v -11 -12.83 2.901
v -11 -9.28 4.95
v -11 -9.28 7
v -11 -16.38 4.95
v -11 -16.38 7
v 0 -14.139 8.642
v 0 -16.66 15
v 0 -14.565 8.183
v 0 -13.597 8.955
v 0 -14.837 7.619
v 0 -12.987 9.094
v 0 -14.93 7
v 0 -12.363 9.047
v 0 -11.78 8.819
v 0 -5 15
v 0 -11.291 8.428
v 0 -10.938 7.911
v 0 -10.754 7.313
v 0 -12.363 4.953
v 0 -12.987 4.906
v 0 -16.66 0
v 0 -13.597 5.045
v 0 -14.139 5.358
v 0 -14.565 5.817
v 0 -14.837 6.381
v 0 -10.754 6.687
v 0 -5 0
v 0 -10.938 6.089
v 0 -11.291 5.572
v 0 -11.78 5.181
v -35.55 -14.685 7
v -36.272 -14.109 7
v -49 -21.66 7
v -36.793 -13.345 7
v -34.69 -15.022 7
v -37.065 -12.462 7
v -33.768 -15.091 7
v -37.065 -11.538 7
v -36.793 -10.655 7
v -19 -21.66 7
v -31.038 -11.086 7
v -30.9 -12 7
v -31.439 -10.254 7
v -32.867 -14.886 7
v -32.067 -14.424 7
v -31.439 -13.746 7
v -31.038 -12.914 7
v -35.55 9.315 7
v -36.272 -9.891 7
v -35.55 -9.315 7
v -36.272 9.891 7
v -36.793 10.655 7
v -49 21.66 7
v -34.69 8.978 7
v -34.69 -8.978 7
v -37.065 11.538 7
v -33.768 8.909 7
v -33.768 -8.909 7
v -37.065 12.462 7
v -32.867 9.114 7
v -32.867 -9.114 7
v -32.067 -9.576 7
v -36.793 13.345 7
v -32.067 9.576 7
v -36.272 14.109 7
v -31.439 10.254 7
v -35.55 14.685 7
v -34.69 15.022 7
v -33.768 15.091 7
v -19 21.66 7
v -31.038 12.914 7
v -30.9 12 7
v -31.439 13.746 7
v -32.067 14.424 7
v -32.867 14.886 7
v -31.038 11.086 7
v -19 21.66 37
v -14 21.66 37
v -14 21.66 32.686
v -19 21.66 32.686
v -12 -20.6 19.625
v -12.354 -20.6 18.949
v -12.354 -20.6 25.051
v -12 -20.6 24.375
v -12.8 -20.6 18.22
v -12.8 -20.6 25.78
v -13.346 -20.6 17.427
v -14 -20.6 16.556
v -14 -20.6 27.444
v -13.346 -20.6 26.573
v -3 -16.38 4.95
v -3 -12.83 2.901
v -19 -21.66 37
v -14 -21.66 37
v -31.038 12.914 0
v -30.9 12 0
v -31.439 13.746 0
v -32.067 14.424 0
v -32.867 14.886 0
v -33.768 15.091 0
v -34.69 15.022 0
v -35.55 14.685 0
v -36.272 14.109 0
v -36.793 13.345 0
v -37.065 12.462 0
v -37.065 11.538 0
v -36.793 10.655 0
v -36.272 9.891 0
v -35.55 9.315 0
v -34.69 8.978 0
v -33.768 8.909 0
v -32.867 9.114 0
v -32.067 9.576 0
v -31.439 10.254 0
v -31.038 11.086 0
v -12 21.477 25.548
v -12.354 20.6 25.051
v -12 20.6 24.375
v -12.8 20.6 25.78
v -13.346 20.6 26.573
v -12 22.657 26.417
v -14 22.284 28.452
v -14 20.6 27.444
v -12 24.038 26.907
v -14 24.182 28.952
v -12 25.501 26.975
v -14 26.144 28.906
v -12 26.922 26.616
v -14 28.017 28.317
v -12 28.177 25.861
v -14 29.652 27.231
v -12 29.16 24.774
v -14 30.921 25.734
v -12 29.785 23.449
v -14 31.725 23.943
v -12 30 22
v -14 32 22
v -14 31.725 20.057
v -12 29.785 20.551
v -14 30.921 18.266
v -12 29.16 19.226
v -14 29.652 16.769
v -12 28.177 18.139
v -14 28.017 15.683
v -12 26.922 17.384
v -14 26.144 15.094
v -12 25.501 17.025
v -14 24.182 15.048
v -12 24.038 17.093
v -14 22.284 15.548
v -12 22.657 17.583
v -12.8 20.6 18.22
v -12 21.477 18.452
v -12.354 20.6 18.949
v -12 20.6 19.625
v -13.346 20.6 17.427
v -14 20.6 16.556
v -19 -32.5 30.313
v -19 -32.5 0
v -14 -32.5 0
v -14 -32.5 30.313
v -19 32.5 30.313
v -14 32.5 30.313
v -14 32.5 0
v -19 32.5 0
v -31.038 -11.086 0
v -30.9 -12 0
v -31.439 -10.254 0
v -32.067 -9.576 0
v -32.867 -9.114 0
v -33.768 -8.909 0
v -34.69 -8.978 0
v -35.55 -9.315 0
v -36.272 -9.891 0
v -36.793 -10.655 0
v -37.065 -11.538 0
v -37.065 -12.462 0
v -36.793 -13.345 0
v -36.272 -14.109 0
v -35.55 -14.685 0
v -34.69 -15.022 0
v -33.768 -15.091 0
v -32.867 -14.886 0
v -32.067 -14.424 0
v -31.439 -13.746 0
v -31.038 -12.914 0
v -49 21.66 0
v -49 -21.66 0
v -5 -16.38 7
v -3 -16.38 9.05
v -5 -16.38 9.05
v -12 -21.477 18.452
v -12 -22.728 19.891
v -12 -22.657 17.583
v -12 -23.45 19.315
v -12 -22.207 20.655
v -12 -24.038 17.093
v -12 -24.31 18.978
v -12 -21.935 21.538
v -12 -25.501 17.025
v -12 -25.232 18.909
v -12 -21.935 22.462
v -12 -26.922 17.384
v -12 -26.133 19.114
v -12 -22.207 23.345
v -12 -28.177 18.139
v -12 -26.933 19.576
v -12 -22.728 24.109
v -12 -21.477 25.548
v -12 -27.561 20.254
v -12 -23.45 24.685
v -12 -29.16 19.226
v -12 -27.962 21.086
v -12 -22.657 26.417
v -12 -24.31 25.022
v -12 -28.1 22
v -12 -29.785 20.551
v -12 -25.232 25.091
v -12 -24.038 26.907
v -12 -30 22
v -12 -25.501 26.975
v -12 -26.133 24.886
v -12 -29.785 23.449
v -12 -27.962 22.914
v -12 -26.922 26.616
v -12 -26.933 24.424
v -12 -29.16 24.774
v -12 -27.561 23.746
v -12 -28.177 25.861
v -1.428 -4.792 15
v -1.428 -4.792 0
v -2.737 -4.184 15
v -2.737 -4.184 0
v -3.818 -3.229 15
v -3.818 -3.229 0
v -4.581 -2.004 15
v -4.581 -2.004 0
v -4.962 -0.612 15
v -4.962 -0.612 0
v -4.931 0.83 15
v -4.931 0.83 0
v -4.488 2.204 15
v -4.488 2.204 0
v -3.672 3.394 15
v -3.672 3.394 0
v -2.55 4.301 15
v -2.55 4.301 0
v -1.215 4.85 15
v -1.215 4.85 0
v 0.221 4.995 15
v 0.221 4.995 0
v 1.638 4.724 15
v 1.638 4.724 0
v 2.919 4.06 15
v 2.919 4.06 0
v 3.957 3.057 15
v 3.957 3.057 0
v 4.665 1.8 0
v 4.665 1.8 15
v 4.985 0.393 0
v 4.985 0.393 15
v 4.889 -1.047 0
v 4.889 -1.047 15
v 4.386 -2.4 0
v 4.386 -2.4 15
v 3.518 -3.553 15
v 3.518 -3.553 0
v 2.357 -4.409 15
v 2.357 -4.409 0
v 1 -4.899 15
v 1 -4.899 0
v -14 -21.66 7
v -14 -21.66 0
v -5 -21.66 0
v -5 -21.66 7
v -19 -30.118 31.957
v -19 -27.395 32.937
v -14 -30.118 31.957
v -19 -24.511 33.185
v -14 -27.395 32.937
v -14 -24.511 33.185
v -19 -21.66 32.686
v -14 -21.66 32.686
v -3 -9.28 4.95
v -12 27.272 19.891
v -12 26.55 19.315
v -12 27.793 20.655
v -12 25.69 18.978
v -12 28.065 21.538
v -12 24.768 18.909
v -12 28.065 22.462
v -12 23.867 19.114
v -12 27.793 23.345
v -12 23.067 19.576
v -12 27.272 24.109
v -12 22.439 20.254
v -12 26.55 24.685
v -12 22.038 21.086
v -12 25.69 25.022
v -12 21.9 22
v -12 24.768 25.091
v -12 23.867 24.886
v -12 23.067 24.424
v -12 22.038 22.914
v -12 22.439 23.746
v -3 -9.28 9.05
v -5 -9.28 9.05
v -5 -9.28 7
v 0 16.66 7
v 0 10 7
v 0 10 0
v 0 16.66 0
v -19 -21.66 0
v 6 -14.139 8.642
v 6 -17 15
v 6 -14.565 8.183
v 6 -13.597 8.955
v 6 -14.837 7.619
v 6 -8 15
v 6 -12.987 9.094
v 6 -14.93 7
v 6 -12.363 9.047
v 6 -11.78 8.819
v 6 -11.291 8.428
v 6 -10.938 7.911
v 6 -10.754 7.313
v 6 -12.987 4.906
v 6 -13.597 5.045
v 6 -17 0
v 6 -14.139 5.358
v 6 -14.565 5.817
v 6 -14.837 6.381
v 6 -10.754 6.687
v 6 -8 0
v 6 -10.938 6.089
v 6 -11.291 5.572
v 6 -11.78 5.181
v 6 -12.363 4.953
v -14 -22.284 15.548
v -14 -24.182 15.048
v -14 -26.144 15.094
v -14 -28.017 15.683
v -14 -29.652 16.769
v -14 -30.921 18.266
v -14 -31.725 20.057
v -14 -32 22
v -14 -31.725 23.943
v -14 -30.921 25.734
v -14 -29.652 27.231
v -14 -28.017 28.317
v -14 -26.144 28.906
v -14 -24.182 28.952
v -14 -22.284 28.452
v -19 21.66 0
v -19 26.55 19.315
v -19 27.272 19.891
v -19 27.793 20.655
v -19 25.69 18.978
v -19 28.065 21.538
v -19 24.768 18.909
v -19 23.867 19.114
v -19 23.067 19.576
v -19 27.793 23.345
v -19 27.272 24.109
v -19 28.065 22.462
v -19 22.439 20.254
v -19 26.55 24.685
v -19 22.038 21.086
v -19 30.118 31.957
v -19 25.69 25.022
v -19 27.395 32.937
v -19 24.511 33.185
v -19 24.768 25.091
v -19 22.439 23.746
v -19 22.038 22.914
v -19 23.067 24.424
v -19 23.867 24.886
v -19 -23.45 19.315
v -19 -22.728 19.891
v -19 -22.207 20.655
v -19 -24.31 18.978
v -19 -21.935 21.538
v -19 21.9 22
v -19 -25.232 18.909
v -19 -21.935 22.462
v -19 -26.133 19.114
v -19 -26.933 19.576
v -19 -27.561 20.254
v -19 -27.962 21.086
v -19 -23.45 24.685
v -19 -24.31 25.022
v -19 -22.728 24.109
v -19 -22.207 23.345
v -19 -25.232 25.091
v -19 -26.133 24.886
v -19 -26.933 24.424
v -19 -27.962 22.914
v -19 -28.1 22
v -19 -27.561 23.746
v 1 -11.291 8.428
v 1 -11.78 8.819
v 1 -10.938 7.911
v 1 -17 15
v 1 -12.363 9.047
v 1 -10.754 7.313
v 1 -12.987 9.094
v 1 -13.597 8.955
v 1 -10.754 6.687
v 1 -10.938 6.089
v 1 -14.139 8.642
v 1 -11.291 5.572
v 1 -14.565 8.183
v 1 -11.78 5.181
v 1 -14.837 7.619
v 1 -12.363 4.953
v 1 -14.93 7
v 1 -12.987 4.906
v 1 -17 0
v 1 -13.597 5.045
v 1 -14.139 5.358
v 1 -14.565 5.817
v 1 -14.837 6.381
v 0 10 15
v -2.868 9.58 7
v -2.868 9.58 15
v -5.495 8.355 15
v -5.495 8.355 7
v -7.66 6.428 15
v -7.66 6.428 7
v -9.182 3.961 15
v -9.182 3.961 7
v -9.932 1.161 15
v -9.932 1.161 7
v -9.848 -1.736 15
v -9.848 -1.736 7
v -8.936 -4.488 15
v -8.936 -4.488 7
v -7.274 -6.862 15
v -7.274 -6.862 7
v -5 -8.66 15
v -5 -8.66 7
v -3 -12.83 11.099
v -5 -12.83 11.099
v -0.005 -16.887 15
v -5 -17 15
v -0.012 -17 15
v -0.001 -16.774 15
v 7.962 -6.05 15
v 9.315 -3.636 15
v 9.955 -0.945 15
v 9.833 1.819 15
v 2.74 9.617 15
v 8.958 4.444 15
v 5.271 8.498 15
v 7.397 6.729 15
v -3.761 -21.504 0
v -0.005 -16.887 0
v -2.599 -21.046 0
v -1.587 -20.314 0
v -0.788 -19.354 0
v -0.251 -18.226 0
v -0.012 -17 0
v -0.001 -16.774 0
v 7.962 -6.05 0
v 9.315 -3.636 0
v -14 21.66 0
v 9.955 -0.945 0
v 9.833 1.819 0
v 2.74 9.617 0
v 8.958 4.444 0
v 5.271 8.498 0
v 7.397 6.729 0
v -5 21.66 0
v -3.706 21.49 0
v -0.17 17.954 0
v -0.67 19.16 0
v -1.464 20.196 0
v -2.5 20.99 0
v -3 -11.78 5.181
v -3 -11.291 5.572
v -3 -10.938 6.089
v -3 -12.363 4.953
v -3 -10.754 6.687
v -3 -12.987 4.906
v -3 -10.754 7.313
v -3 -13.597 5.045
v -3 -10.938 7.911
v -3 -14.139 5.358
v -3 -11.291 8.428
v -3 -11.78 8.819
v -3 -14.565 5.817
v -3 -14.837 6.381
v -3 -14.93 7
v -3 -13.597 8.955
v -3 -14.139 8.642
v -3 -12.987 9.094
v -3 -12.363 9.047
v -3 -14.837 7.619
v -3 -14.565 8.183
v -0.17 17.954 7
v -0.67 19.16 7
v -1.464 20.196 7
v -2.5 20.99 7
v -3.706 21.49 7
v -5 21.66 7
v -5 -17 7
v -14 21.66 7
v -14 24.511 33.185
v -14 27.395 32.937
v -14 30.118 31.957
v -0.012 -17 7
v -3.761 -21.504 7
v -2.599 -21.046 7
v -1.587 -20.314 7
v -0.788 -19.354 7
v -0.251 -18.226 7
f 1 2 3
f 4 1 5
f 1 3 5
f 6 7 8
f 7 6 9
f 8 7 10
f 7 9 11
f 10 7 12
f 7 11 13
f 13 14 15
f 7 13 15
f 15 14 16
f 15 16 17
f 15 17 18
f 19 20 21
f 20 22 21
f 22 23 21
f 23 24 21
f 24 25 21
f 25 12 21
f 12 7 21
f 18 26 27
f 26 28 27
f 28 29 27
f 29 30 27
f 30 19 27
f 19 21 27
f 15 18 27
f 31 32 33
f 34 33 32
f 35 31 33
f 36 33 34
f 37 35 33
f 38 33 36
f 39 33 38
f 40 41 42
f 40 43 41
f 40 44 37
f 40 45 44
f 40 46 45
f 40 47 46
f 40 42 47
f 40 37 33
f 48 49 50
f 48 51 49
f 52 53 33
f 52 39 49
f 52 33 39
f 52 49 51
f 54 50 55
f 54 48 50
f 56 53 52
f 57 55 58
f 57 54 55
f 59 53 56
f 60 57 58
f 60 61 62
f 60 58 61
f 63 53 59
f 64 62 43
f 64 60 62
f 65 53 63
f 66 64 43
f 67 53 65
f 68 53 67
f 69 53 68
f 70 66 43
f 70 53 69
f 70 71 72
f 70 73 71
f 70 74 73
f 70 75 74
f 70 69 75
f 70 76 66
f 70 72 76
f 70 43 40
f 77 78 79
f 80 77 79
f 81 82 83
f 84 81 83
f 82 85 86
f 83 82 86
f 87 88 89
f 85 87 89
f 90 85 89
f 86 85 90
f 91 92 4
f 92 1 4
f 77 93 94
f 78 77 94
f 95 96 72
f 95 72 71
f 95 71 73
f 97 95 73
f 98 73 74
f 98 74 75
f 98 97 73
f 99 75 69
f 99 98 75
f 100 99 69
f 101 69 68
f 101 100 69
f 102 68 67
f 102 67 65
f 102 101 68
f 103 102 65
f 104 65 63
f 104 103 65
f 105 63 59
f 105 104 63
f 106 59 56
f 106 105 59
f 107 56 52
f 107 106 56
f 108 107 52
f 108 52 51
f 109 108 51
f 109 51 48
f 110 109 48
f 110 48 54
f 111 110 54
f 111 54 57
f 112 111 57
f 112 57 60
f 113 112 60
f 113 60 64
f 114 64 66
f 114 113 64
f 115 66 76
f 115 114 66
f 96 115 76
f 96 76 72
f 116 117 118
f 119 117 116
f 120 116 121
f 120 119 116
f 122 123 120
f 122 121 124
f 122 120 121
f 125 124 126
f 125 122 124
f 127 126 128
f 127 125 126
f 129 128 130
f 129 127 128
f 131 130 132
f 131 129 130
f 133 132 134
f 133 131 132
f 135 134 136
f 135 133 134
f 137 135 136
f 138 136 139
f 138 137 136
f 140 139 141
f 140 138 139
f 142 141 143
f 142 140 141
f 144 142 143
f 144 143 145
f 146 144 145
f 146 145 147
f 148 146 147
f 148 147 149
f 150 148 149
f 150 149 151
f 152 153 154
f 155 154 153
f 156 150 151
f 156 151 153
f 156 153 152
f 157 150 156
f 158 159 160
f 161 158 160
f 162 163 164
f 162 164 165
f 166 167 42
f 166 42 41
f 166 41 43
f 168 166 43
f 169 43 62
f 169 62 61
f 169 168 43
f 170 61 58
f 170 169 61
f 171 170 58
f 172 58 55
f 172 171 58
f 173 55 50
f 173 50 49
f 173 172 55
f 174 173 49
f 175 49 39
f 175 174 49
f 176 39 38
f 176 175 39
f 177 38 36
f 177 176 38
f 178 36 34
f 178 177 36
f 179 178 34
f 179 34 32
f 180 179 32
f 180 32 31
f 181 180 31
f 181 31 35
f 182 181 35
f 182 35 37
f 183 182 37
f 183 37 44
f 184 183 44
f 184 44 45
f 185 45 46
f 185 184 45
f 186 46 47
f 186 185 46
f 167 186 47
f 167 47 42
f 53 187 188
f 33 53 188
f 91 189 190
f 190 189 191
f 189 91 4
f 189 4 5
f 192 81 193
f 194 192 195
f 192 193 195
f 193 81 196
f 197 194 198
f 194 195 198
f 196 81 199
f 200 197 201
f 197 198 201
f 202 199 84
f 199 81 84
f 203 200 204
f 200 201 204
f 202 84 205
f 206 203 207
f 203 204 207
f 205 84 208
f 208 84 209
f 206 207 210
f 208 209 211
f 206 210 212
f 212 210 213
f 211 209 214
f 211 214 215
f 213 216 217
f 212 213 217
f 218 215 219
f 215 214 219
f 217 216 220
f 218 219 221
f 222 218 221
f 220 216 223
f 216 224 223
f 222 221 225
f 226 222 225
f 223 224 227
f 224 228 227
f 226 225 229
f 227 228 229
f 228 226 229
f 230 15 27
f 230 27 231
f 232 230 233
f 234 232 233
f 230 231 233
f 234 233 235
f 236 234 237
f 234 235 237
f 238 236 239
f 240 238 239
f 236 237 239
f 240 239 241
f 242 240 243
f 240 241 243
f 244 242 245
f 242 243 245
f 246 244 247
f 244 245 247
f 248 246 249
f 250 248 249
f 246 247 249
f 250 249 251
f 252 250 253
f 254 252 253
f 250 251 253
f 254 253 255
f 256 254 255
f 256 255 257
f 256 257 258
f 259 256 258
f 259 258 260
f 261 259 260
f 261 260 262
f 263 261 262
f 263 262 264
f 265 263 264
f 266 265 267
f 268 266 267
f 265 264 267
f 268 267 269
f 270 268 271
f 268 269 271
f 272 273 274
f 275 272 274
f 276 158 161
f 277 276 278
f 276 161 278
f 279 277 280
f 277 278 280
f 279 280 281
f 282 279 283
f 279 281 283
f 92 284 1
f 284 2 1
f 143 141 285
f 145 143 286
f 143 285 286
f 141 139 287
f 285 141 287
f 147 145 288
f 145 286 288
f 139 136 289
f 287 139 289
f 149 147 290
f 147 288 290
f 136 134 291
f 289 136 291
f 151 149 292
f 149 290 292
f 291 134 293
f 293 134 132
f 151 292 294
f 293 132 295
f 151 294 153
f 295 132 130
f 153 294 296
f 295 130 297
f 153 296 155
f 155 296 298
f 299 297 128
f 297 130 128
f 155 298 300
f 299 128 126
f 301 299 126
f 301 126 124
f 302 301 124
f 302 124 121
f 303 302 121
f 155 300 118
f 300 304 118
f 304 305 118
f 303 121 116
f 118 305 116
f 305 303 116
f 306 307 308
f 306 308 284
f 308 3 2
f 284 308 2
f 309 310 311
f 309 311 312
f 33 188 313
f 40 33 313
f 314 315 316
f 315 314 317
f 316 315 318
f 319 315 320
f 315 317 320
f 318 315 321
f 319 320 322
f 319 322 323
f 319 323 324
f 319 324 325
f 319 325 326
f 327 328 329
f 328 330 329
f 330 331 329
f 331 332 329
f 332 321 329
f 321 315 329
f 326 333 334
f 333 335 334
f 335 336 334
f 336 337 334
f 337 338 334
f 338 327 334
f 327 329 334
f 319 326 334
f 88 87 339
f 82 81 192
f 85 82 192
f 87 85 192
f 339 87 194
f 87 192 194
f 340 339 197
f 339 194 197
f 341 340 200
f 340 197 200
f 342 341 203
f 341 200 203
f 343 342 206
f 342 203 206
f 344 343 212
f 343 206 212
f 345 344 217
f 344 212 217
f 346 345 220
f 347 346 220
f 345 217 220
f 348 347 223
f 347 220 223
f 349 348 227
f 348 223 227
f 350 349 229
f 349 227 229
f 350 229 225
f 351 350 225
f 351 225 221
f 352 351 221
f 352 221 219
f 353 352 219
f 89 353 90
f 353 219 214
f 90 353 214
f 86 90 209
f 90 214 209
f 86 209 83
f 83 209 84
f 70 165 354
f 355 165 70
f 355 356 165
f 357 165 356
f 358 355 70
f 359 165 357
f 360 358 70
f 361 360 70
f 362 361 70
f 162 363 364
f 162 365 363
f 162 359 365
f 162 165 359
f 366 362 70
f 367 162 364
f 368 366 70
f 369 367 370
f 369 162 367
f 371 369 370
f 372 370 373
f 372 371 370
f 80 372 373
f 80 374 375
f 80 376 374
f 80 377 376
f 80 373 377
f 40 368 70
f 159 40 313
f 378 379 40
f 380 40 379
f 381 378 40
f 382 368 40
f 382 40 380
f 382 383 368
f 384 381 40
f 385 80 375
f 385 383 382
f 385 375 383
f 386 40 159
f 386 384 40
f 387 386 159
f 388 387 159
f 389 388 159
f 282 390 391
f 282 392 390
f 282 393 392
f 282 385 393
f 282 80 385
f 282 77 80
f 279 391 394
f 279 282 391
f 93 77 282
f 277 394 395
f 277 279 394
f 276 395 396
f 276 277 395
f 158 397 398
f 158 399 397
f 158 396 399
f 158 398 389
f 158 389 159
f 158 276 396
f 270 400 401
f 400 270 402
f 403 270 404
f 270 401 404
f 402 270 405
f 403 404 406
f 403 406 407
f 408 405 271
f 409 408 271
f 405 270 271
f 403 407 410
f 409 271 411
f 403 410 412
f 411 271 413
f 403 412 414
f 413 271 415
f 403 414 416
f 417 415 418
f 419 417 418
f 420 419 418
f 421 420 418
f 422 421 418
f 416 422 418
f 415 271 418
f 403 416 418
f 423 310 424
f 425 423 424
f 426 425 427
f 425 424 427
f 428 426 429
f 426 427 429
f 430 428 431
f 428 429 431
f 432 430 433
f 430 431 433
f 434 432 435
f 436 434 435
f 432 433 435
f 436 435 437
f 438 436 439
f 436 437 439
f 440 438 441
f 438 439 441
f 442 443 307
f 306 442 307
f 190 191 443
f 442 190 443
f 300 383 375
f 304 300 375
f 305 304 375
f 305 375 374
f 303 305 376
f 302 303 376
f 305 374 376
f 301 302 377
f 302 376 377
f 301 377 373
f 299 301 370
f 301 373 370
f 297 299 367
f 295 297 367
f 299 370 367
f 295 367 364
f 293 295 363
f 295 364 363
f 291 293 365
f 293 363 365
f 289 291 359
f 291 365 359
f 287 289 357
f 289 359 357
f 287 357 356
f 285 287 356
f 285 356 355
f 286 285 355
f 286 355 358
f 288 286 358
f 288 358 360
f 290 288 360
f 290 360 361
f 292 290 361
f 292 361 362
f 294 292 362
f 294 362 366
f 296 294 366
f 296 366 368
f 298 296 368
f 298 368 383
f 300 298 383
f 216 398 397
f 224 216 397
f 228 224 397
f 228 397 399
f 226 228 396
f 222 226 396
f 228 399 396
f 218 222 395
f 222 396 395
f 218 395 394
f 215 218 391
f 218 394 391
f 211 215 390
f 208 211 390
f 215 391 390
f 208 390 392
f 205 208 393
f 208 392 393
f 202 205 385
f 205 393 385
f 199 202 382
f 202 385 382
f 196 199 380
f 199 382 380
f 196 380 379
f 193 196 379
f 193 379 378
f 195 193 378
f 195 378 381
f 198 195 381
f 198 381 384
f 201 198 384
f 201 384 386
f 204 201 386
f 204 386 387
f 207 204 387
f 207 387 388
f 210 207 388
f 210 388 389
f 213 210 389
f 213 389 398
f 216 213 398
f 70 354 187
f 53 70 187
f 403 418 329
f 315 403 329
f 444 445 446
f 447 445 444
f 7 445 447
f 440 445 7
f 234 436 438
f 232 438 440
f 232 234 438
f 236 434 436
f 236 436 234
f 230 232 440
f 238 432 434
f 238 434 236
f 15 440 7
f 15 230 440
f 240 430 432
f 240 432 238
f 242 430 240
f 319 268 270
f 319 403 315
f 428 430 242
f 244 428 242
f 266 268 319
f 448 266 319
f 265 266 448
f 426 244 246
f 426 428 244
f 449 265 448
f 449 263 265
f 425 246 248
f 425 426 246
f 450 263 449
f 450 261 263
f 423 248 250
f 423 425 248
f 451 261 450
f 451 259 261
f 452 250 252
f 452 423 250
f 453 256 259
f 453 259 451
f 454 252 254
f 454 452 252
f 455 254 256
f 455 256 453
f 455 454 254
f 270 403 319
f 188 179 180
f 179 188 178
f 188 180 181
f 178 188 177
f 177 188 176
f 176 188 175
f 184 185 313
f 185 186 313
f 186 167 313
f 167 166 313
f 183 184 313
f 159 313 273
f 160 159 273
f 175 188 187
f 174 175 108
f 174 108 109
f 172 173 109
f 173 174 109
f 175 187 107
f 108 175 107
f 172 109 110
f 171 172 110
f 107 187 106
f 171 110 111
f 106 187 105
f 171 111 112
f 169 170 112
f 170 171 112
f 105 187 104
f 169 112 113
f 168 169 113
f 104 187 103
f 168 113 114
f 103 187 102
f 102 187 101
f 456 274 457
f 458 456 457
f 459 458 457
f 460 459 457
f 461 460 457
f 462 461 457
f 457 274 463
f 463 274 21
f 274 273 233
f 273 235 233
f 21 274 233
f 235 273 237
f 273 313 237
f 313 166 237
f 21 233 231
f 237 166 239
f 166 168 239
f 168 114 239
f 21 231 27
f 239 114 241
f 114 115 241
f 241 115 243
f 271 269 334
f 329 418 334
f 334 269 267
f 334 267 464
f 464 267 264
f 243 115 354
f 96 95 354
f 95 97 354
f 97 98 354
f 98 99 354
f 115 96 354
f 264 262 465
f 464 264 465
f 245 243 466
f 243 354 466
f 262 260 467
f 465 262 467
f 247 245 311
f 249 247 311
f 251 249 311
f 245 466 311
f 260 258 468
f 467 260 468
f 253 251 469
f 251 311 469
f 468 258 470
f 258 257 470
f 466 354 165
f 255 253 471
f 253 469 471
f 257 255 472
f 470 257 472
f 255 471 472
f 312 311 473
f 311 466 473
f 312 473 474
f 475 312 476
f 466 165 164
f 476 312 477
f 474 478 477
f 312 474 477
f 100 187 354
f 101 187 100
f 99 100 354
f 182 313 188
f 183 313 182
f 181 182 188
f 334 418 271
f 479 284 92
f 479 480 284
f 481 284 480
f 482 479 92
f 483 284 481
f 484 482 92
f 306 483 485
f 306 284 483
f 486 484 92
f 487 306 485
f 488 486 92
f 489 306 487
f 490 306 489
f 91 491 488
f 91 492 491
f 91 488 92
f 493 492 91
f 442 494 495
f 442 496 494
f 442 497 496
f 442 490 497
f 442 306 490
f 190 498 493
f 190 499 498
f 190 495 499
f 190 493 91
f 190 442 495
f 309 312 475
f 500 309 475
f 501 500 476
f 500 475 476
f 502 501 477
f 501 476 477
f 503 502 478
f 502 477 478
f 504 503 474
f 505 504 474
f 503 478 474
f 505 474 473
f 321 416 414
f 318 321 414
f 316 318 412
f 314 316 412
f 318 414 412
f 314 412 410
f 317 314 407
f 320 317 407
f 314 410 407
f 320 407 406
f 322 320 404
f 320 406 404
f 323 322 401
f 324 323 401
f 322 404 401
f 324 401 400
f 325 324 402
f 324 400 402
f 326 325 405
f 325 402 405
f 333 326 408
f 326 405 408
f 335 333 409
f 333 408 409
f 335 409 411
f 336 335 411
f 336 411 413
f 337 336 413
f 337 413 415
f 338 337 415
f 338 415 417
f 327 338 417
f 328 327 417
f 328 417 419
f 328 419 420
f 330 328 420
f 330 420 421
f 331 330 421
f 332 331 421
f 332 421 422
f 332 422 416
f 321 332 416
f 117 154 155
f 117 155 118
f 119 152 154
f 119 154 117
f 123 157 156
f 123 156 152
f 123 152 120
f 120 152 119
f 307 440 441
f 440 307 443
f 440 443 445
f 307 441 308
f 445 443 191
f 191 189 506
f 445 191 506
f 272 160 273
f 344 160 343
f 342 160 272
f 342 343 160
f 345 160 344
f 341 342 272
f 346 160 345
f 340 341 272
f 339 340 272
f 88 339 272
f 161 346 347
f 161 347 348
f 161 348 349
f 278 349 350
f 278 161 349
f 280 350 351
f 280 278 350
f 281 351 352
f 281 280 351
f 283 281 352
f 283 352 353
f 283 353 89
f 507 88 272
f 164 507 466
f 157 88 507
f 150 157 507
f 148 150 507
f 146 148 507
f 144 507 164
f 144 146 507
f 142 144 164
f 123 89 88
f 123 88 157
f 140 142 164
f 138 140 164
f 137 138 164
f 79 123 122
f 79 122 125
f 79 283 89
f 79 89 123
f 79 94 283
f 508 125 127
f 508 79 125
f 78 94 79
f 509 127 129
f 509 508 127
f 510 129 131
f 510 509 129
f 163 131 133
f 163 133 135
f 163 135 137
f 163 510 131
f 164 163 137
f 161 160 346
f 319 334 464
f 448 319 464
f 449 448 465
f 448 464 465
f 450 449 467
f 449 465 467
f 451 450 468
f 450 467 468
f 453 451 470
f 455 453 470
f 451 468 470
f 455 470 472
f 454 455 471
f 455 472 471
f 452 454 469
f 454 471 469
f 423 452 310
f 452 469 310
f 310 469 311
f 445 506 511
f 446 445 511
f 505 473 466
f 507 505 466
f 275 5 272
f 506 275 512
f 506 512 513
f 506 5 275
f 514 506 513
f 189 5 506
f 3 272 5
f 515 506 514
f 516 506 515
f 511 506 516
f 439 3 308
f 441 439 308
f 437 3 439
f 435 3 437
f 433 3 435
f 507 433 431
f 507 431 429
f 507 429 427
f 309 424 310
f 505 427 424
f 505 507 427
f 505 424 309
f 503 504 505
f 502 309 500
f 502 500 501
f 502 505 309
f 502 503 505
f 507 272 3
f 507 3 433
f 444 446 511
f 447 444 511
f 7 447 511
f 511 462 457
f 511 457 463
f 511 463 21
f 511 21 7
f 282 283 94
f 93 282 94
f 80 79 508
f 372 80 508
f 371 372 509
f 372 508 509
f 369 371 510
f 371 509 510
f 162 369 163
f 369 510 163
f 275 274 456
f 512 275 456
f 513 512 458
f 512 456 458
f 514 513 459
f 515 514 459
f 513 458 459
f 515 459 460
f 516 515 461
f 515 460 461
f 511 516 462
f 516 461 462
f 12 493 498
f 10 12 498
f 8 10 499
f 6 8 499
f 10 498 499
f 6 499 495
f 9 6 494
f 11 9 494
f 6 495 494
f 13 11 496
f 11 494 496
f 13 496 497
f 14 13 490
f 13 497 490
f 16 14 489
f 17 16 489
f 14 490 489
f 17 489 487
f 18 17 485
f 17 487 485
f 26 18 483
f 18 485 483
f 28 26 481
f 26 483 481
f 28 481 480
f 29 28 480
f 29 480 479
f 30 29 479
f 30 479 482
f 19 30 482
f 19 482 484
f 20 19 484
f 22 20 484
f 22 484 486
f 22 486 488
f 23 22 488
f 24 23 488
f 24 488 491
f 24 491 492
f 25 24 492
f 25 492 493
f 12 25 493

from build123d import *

# Parameters (mm, degrees)
F0_R          = 3.1
F1_DEPTH      = 7
F2_DEPTH      = 15
F4_DEPTH      = 2
F4_DEPTH_BACK = 6
F5_R          = 2.1
F6_DEPTH      = 25
F8_DEPTH      = 30
F9_DEPTH      = 25
F9_DEPTH_BACK = 7
F10_R         = 3.1
F11_DEPTH     = 25
F12_R         = 5
F12_R_2       = 3.1
F13_DEPTH     = 7
F14_SIZE      = 1.99999
F15_W         = 3.459926136
F15_H         = 15.633740799
F16_DEPTH     = 25
F18_DEPTH     = 25


# Not quite as in the source:
# - a fillet or chamfer is up to 0.001 mm smaller than in the source, because OpenCascade refuses the exact size


with BuildPart() as f1:
    # F0 (on Top) → F1 (new body)
    with BuildSketch(Plane.XY):
        with BuildLine():
            ThreePointArc((-5, -21.6602540378), (-1.5866973333, -20.3139323085), (-0.0115560862, -17))
            Line((-0.0115560862, -17), (-5, -17))
            Line((-5, -17), (-5, -8.6602540378))
            ThreePointArc((-5, -8.6602540378), (-9.6592582629, 2.588190451), (0, 10))
            Line((0, 10), (0, 16.6602540378))
            ThreePointArc((0, 16.6602540378), (-1.4644660941, 20.1957879438), (-5, 21.6602540378))
            Line((-5, 21.6602540378), (-49, 21.6602540378))
            Line((-49, 21.6602540378), (-49, 0))
            Line((-49, 0), (-49, -21.6602540378))
            Line((-49, -21.6602540378), (-5, -21.6602540378))
        make_face()
        with Locations((-34, -12)):
            Circle(F0_R, mode=Mode.SUBTRACT)
        with Locations((-34, 12)):
            Circle(F0_R, mode=Mode.SUBTRACT)
    extrude(amount=F1_DEPTH)

    # F0 (on Top) → F2 (join)
    with BuildSketch(Plane.XY):
        with BuildLine():
            ThreePointArc((0, -5), (-0.50254481, 4.974680765), (1, -4.8989794856))
            Line((1, -4.8989794856), (1, -9.9498743711))
            Line((1, -9.9498743711), (1, -17))
            Line((1, -17), (6, -17))
            Line((6, -17), (6, -8))
            ThreePointArc((6, -8), (9.4868329805, 3.1622776602), (0, 10))
            ThreePointArc((0, 10), (-9.6592582629, 2.588190451), (-5, -8.6602540378))
            Line((-5, -8.6602540378), (-5, -17))
            Line((-5, -17), (-0.0115560862, -17))
            ThreePointArc((-0.0115560862, -17), (-0.0028898567, -16.8302252574), (0, -16.6602540378))
            Line((0, -16.6602540378), (0, -10))
            Line((0, -10), (0, -5))
        make_face()
    extrude(amount=F2_DEPTH)

    # F3 (on face) → F4 (cut, two sides)
    with BuildSketch(Plane(origin=(-5, 0, 0), x_dir=(0, -1, 0), z_dir=(-1, 0, 0))) as f4_sk:
        Polygon((16.3801270189, 4.9504065444), (16.3801270189, 9.0495934556), (12.8301270189, 11.0991869112), (9.2801270189, 9.0495934556), (9.2801270189, 4.9504065444), (12.8301270189, 2.9008130888), align=None)
    extrude(amount=-F4_DEPTH, mode=Mode.SUBTRACT)
    extrude(f4_sk.sketch, amount=F4_DEPTH_BACK, mode=Mode.SUBTRACT)

    # F5 (on face) → F6 (cut)
    with BuildSketch(Plane(origin=(-5, 0, 0), x_dir=(0, -1, 0), z_dir=(-1, 0, 0))):
        with Locations((12.8301270189, 7)):
            Circle(F5_R)
    extrude(amount=-F6_DEPTH, mode=Mode.SUBTRACT)

    # F7 (on face) → F8 (join)
    with BuildSketch(Plane.XY.offset(7)):
        Polygon((-19, 32.5), (-19, 21.6602540378), (-19, -21.6602540378), (-19, -32.5), (-14, -32.5), (-14, -21.6602540378), (-14, 21.6602540378), (-14, 32.5), align=None)
    extrude(amount=F8_DEPTH)

    # F7 (on face) → F9 (join, two sides)
    with BuildSketch(Plane.XY.offset(7)) as f9_sk:
        Polygon((-19, 32.5), (-19, 21.6602540378), (-19, -21.6602540378), (-19, -32.5), (-14, -32.5), (-14, -21.6602540378), (-14, 21.6602540378), (-14, 32.5), align=None)
    extrude(amount=F9_DEPTH)
    extrude(f9_sk.sketch, amount=-F9_DEPTH_BACK)

    # F10 (on face) → F11 (cut)
    with BuildSketch(Plane(origin=(-19, 0, 0), x_dir=(0, -1, 0), z_dir=(-1, 0, 0))):
        with Locations((-25, 22)):
            Circle(F10_R)
        with Locations((25, 22)):
            Circle(F10_R)
    extrude(amount=-F11_DEPTH, mode=Mode.SUBTRACT)

    # F12 (on face) → F13 (join)
    with BuildSketch(Plane(origin=(-19, 0, 0), x_dir=(0, -1, 0), z_dir=(-1, 0, 0))):
        with Locations((25, 22)):
            Circle(F12_R)
        with Locations((25, 22)):
            Circle(F12_R_2, mode=Mode.SUBTRACT)
        with Locations((-25, 22)):
            Circle(F12_R)
        with Locations((-25, 22)):
            Circle(F12_R_2, mode=Mode.SUBTRACT)
    extrude(amount=-F13_DEPTH)

    # F14 (size 2 in the source; OpenCascade refuses exactly that, so slightly less here)
    f14_edges = [f1.edges().sort_by_distance(p)[0] for p in [
        (-14, 30, 22),
        (-14, -20, 22),
    ]]
    chamfer(f14_edges, length=F14_SIZE)

    # F15 (on face) → F16 (cut)
    with BuildSketch(Plane.YZ.offset(-14)):
        with Locations((18.870036932, 22.279205732)):
            Rectangle(F15_W, F15_H)
        with Locations((-18.870036932, 22.279205732)):
            Rectangle(F15_W, F15_H)
    extrude(amount=F16_DEPTH, mode=Mode.SUBTRACT)

    # F17 (on face) → F18 (cut)
    with BuildSketch(Plane.YZ.offset(-14)):
        with BuildLine():
            Line((21.6602540378, 43.2897545397), (21.6602540378, 32.6861559824))
            ThreePointArc((21.6602540378, 32.6861559824), (27.3948854866, 32.9367434036), (32.5, 30.3125106178))
            Line((32.5, 30.3125106178), (32.5, 43.2897545397))
            Line((32.5, 43.2897545397), (21.6602540378, 43.2897545397))
        make_face()
        with BuildLine():
            ThreePointArc((-32.5, 30.3125106178), (-27.3948854866, 32.9367434036), (-21.6602540378, 32.6861559824))
            Line((-21.6602540378, 32.6861559824), (-21.6602540378, 43.2897545397))
            Line((-21.6602540378, 43.2897545397), (-32.5, 43.2897545397))
            Line((-32.5, 43.2897545397), (-32.5, 30.3125106178))
        make_face()
    extrude(amount=-F18_DEPTH, mode=Mode.SUBTRACT)


solid = f1.part
